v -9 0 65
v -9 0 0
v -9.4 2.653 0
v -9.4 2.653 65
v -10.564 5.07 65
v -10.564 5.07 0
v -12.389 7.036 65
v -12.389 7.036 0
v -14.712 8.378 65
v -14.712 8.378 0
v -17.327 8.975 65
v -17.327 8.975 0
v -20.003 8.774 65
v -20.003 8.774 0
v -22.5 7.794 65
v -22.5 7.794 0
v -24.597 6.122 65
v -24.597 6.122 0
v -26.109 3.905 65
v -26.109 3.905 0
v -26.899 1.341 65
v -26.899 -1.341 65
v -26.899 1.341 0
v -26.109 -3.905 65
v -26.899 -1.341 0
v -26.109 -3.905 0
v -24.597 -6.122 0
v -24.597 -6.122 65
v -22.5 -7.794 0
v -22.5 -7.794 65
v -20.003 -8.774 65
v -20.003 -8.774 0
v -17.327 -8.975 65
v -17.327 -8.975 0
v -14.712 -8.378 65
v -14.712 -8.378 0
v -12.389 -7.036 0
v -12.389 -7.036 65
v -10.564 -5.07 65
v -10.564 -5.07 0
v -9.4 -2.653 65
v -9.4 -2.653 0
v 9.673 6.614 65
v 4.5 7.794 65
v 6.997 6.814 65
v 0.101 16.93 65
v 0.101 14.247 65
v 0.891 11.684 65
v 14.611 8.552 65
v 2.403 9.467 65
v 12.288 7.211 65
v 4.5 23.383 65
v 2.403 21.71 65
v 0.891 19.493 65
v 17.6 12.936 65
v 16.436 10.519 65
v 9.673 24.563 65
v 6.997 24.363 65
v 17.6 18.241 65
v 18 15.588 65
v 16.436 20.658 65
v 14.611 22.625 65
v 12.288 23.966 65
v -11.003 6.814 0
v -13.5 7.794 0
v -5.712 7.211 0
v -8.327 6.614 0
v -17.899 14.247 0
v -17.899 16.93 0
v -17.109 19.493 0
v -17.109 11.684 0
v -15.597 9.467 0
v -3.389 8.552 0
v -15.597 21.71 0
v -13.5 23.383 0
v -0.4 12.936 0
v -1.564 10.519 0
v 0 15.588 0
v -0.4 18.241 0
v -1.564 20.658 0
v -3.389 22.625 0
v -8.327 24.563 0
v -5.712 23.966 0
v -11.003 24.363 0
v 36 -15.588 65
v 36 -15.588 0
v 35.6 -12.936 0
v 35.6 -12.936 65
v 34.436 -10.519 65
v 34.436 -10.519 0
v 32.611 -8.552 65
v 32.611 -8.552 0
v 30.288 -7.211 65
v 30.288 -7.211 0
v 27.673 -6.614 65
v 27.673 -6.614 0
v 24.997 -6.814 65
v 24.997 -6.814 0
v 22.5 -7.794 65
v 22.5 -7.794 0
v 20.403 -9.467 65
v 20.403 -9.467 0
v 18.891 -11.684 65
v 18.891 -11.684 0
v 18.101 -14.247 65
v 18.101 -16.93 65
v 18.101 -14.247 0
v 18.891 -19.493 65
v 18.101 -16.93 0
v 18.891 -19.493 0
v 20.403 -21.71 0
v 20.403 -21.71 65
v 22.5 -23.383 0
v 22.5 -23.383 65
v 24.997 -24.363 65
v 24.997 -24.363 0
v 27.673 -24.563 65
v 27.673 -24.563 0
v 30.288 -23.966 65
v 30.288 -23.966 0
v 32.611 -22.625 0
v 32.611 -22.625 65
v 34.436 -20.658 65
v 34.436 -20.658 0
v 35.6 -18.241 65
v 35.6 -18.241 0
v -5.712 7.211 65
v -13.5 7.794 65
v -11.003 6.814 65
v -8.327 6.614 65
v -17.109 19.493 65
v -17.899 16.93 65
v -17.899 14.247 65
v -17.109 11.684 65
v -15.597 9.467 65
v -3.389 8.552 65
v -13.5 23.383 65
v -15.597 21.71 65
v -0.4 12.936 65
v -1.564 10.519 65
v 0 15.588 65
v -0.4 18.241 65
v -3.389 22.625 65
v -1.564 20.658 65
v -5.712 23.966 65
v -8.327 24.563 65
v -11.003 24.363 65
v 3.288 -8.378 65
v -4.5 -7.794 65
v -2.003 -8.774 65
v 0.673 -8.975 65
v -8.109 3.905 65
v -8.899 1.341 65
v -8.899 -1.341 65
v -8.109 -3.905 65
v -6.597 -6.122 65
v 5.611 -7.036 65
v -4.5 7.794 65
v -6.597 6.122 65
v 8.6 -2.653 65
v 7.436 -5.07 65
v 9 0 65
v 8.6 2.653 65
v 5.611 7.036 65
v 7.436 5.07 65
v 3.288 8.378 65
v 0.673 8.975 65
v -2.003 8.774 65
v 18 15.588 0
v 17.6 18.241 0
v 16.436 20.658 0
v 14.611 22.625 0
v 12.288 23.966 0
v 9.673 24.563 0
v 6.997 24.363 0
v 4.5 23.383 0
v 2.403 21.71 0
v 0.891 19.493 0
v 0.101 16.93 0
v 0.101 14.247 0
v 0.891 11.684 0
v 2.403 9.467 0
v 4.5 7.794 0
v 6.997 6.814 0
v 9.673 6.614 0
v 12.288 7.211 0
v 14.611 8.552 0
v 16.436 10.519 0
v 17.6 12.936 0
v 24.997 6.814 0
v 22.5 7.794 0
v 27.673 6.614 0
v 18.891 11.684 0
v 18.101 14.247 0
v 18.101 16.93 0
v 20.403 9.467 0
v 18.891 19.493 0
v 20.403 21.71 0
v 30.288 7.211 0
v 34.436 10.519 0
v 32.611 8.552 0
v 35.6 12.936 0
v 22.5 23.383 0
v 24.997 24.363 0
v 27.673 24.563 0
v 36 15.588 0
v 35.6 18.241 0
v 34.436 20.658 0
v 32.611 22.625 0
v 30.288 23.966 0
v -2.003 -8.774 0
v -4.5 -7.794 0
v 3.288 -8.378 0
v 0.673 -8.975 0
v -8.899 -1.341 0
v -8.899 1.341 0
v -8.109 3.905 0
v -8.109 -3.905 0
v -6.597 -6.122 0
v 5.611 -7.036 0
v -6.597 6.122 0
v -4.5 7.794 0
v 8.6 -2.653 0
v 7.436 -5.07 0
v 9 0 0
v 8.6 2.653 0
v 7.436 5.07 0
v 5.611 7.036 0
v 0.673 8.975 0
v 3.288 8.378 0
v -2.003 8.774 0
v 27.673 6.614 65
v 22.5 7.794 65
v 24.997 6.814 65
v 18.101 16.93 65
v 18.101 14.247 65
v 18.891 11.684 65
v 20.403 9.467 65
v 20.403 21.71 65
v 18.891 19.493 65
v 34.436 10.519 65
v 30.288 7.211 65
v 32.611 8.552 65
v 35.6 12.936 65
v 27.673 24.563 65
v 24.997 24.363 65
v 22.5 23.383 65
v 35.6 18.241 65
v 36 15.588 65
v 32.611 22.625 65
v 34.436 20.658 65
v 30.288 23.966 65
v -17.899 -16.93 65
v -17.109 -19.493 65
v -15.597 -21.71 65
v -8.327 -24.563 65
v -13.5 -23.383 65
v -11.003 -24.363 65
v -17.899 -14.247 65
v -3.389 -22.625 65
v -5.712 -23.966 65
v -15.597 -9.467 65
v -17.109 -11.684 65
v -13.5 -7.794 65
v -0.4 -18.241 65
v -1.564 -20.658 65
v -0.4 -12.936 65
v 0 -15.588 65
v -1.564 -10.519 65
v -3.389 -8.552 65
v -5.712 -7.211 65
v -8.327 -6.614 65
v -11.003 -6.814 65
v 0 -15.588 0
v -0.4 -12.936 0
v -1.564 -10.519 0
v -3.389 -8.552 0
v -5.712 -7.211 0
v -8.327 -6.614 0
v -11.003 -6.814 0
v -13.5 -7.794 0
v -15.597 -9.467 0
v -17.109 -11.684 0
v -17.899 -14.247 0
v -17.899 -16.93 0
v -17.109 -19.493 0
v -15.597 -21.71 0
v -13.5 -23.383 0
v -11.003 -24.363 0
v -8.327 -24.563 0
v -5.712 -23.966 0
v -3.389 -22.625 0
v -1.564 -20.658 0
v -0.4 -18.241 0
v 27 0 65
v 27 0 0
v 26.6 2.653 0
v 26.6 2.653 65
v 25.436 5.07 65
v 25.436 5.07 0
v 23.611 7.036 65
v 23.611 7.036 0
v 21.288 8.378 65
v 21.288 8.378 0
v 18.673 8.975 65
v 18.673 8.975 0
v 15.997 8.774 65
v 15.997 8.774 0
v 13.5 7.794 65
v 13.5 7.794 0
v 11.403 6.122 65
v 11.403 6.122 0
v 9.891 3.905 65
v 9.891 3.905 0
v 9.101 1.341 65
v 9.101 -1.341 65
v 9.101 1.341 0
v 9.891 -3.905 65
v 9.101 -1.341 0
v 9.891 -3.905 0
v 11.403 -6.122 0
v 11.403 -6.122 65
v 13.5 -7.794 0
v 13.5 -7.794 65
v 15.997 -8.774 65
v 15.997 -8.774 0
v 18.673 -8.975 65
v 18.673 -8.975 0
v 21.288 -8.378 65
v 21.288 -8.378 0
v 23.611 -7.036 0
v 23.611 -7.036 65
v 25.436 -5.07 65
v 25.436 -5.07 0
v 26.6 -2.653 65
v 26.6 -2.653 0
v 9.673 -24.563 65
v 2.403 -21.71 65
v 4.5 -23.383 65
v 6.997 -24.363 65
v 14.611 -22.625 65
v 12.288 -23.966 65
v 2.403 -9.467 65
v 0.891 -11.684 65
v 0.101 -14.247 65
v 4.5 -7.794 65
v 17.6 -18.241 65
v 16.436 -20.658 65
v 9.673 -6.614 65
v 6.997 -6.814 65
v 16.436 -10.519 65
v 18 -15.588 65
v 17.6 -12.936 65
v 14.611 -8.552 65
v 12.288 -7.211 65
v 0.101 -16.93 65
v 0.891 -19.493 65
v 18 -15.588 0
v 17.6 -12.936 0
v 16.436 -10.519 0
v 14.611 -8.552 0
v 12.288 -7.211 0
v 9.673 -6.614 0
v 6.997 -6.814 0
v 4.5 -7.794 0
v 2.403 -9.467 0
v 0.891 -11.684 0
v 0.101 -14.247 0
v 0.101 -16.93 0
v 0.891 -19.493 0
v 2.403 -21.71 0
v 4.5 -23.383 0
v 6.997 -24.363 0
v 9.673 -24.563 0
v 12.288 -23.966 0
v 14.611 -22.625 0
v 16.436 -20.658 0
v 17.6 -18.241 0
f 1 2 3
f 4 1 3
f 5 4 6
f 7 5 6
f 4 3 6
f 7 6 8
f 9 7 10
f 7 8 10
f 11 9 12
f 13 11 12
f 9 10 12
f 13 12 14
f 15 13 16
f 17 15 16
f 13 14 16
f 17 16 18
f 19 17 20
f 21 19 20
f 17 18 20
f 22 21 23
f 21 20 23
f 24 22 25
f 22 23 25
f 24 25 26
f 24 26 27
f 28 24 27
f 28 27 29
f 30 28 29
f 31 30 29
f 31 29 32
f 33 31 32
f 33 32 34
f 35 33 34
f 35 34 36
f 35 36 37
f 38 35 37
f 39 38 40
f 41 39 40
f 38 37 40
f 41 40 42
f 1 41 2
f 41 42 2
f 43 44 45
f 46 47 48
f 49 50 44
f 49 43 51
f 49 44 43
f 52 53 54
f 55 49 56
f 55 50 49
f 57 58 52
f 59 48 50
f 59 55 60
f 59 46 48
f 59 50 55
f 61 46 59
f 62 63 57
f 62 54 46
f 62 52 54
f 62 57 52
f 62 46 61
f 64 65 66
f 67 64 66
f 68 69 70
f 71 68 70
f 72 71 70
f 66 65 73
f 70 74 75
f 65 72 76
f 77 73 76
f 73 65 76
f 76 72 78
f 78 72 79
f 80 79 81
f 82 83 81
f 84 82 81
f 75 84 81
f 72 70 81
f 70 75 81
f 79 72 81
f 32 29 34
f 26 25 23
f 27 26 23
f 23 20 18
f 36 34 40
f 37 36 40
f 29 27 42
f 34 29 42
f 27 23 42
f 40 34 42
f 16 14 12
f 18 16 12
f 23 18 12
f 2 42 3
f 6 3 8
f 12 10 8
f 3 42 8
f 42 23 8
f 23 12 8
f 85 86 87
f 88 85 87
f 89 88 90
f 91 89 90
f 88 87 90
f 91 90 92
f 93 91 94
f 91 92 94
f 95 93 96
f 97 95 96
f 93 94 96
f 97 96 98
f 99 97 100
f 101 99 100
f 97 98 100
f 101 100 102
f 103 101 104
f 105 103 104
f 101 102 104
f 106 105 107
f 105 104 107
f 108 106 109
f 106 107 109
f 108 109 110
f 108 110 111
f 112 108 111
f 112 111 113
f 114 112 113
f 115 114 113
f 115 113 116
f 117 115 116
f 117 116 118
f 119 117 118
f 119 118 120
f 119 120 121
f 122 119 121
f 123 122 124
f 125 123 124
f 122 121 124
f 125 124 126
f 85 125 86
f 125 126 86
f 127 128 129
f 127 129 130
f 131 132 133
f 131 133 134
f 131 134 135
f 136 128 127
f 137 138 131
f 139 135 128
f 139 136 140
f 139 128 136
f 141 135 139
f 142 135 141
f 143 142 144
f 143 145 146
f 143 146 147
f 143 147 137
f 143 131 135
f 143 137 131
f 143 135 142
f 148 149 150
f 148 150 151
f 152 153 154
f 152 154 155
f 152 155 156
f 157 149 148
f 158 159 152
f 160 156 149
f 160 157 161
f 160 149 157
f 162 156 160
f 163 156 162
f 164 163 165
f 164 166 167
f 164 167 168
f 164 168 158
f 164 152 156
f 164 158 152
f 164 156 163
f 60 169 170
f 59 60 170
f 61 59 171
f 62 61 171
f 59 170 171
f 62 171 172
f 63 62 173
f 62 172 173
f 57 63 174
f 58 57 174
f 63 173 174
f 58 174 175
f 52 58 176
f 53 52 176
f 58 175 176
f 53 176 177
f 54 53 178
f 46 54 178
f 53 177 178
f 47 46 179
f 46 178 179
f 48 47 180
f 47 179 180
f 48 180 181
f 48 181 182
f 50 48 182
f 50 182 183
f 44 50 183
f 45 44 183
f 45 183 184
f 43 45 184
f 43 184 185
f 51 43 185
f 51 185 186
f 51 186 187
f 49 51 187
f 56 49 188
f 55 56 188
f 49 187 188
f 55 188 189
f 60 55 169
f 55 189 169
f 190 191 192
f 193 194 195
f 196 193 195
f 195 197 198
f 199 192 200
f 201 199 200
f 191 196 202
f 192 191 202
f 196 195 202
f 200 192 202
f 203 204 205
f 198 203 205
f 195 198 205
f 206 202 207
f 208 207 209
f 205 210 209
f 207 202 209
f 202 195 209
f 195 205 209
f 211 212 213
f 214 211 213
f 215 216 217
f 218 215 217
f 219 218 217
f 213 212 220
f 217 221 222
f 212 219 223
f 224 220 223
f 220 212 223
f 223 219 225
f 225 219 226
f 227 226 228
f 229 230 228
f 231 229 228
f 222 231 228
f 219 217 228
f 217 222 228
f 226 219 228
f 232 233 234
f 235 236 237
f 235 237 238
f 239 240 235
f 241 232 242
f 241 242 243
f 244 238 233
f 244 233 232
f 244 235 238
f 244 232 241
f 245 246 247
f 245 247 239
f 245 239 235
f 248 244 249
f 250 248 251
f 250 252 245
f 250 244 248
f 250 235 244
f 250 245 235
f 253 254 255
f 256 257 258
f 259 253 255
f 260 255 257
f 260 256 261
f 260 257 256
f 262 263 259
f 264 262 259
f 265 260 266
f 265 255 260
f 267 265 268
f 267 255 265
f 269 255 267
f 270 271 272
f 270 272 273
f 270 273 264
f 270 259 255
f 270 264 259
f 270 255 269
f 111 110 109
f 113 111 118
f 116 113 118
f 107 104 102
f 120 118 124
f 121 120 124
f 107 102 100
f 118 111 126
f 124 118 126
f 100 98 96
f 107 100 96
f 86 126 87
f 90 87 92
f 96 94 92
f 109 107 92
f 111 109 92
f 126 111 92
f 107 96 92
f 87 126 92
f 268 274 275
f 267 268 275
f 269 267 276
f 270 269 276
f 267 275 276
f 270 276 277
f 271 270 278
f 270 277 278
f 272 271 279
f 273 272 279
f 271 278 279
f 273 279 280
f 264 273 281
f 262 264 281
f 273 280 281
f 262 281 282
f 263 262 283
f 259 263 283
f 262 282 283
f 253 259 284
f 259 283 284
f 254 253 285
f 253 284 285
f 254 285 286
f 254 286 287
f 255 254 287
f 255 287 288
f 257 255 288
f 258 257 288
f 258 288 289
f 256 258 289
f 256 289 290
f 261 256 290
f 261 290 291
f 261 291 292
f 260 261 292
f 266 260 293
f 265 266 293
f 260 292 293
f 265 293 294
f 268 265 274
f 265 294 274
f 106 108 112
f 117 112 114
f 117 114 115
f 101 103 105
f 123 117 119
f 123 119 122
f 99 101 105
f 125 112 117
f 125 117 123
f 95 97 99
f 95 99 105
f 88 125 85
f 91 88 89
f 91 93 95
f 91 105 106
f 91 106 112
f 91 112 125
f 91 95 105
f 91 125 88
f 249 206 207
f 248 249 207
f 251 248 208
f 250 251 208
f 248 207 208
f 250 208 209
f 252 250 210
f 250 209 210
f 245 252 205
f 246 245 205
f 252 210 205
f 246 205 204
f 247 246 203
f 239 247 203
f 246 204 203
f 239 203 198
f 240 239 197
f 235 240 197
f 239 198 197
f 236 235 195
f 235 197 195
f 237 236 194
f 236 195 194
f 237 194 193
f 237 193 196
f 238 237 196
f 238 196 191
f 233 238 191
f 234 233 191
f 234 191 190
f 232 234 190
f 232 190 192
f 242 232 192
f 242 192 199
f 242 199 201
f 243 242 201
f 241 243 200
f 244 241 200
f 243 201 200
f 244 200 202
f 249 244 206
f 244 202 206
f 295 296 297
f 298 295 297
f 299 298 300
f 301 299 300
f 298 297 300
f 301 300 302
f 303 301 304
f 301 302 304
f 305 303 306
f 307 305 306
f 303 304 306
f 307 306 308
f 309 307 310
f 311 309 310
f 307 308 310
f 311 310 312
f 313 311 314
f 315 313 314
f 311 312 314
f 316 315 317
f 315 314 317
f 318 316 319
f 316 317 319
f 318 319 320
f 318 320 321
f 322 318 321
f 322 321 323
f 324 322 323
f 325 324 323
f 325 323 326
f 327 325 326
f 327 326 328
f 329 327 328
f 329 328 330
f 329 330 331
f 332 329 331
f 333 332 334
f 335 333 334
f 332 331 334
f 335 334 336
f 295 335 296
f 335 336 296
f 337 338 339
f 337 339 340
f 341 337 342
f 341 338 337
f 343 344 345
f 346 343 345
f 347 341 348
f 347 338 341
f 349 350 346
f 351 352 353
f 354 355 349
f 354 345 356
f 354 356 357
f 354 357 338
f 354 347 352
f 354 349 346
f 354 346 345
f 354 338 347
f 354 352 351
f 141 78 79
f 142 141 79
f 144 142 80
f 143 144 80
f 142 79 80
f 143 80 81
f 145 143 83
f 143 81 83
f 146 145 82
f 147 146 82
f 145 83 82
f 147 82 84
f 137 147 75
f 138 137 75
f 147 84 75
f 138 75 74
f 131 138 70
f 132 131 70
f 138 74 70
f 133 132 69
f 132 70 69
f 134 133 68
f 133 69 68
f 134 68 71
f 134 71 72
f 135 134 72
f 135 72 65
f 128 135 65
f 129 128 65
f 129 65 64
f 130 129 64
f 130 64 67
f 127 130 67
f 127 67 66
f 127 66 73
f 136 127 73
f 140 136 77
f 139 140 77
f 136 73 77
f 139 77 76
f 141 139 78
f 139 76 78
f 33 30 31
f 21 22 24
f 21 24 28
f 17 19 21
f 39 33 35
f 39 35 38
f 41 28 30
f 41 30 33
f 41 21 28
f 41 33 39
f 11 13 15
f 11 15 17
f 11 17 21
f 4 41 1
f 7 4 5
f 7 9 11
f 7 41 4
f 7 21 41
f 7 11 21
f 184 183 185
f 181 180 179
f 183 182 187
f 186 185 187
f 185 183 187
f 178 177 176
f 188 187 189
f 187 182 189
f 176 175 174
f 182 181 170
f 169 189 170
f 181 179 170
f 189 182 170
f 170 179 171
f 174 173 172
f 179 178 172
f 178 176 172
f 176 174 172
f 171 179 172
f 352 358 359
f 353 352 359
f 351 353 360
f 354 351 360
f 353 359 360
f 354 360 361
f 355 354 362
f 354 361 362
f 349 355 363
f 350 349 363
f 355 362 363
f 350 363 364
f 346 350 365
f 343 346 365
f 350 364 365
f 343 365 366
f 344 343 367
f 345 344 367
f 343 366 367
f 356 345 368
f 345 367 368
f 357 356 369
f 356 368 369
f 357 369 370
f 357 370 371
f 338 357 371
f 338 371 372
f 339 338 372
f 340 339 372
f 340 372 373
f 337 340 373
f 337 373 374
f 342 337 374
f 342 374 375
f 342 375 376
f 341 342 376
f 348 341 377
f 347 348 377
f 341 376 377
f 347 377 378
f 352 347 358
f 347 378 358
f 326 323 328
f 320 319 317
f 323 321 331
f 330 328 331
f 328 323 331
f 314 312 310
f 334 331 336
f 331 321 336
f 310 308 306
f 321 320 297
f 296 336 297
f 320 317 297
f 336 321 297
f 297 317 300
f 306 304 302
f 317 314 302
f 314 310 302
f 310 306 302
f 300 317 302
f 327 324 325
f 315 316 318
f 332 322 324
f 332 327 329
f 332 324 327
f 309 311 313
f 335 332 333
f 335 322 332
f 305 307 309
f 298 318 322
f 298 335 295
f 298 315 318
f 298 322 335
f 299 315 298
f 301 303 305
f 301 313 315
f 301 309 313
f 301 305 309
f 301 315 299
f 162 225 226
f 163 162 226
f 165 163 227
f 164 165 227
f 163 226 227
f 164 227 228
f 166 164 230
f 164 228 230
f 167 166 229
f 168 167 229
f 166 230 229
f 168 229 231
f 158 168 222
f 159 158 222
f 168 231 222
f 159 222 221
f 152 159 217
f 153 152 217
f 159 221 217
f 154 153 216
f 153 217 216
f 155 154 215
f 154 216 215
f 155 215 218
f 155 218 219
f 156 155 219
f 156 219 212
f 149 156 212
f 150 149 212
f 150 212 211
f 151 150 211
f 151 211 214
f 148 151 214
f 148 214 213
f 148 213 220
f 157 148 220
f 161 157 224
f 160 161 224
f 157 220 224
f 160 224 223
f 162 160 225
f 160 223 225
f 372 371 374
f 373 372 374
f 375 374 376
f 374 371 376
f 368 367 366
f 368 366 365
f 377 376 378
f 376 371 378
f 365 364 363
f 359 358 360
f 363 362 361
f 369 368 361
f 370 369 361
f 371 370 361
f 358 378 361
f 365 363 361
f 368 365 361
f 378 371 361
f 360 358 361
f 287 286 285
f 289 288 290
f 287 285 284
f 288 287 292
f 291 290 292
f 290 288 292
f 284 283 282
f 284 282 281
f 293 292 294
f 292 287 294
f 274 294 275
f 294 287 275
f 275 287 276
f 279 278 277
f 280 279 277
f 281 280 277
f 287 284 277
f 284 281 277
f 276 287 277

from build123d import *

# Parameters (mm, degrees)
ESQUISSE1_R          = 9
BOSS_EXTRU_1_DEPTH   = 65
BOSS_EXTRU_1_2_DEPTH = 65
BOSS_EXTRU_1_3_DEPTH = 65
BOSS_EXTRU_1_4_DEPTH = 65
BOSS_EXTRU_1_5_DEPTH = 65
BOSS_EXTRU_1_6_DEPTH = 65
BOSS_EXTRU_1_7_DEPTH = 65
BOSS_EXTRU_1_8_DEPTH = 65
BOSS_EXTRU_1_9_DEPTH = 65


with BuildPart() as part:
    # Esquisse1 → Boss.-Extru.1 (new body)
    with BuildSketch(Plane.XY):
        with Locations((-18, 0)):
            Circle(ESQUISSE1_R)
    extrude(amount=BOSS_EXTRU_1_DEPTH)


with BuildPart() as body_2:
    # Esquisse1 → Boss.-Extru.1 2 (new body)
    with BuildSketch(Plane.XY):
        with Locations((-9, 15.588457268)):
            Circle(ESQUISSE1_R)
    extrude(amount=BOSS_EXTRU_1_2_DEPTH)


with BuildPart() as body_3:
    # Esquisse1 → Boss.-Extru.1 3 (new body)
    with BuildSketch(Plane.XY):
        Circle(ESQUISSE1_R)
    extrude(amount=BOSS_EXTRU_1_3_DEPTH)


with BuildPart() as body_4:
    # Esquisse1 → Boss.-Extru.1 4 (new body)
    with BuildSketch(Plane.XY):
        with Locations((9, 15.588457268)):
            Circle(ESQUISSE1_R)
    extrude(amount=BOSS_EXTRU_1_4_DEPTH)


with BuildPart() as body_5:
    # Esquisse1 → Boss.-Extru.1 5 (new body)
    with BuildSketch(Plane.XY):
        with Locations((27, 15.588457268)):
            Circle(ESQUISSE1_R)
    extrude(amount=BOSS_EXTRU_1_5_DEPTH)


with BuildPart() as body_6:
    # Esquisse1 → Boss.-Extru.1 6 (new body)
    with BuildSketch(Plane.XY):
        with Locations((18, 0)):
            Circle(ESQUISSE1_R)
    extrude(amount=BOSS_EXTRU_1_6_DEPTH)


with BuildPart() as body_7:
    # Esquisse1 → Boss.-Extru.1 7 (new body)
    with BuildSketch(Plane.XY):
        with Locations((9, -15.588457268)):
            Circle(ESQUISSE1_R)
    extrude(amount=BOSS_EXTRU_1_7_DEPTH)


with BuildPart() as body_8:
    # Esquisse1 → Boss.-Extru.1 8 (new body)
    with BuildSketch(Plane.XY):
        with Locations((-9, -15.588457268)):
            Circle(ESQUISSE1_R)
    extrude(amount=BOSS_EXTRU_1_8_DEPTH)


with BuildPart() as body_9:
    # Esquisse1 → Boss.-Extru.1 9 (new body)
    with BuildSketch(Plane.XY):
        with Locations((27, -15.588457268)):
            Circle(ESQUISSE1_R)
    extrude(amount=BOSS_EXTRU_1_9_DEPTH)


solid = Compound([part.part, body_2.part, body_3.part, body_4.part, body_5.part, body_6.part, body_7.part, body_8.part, body_9.part])
